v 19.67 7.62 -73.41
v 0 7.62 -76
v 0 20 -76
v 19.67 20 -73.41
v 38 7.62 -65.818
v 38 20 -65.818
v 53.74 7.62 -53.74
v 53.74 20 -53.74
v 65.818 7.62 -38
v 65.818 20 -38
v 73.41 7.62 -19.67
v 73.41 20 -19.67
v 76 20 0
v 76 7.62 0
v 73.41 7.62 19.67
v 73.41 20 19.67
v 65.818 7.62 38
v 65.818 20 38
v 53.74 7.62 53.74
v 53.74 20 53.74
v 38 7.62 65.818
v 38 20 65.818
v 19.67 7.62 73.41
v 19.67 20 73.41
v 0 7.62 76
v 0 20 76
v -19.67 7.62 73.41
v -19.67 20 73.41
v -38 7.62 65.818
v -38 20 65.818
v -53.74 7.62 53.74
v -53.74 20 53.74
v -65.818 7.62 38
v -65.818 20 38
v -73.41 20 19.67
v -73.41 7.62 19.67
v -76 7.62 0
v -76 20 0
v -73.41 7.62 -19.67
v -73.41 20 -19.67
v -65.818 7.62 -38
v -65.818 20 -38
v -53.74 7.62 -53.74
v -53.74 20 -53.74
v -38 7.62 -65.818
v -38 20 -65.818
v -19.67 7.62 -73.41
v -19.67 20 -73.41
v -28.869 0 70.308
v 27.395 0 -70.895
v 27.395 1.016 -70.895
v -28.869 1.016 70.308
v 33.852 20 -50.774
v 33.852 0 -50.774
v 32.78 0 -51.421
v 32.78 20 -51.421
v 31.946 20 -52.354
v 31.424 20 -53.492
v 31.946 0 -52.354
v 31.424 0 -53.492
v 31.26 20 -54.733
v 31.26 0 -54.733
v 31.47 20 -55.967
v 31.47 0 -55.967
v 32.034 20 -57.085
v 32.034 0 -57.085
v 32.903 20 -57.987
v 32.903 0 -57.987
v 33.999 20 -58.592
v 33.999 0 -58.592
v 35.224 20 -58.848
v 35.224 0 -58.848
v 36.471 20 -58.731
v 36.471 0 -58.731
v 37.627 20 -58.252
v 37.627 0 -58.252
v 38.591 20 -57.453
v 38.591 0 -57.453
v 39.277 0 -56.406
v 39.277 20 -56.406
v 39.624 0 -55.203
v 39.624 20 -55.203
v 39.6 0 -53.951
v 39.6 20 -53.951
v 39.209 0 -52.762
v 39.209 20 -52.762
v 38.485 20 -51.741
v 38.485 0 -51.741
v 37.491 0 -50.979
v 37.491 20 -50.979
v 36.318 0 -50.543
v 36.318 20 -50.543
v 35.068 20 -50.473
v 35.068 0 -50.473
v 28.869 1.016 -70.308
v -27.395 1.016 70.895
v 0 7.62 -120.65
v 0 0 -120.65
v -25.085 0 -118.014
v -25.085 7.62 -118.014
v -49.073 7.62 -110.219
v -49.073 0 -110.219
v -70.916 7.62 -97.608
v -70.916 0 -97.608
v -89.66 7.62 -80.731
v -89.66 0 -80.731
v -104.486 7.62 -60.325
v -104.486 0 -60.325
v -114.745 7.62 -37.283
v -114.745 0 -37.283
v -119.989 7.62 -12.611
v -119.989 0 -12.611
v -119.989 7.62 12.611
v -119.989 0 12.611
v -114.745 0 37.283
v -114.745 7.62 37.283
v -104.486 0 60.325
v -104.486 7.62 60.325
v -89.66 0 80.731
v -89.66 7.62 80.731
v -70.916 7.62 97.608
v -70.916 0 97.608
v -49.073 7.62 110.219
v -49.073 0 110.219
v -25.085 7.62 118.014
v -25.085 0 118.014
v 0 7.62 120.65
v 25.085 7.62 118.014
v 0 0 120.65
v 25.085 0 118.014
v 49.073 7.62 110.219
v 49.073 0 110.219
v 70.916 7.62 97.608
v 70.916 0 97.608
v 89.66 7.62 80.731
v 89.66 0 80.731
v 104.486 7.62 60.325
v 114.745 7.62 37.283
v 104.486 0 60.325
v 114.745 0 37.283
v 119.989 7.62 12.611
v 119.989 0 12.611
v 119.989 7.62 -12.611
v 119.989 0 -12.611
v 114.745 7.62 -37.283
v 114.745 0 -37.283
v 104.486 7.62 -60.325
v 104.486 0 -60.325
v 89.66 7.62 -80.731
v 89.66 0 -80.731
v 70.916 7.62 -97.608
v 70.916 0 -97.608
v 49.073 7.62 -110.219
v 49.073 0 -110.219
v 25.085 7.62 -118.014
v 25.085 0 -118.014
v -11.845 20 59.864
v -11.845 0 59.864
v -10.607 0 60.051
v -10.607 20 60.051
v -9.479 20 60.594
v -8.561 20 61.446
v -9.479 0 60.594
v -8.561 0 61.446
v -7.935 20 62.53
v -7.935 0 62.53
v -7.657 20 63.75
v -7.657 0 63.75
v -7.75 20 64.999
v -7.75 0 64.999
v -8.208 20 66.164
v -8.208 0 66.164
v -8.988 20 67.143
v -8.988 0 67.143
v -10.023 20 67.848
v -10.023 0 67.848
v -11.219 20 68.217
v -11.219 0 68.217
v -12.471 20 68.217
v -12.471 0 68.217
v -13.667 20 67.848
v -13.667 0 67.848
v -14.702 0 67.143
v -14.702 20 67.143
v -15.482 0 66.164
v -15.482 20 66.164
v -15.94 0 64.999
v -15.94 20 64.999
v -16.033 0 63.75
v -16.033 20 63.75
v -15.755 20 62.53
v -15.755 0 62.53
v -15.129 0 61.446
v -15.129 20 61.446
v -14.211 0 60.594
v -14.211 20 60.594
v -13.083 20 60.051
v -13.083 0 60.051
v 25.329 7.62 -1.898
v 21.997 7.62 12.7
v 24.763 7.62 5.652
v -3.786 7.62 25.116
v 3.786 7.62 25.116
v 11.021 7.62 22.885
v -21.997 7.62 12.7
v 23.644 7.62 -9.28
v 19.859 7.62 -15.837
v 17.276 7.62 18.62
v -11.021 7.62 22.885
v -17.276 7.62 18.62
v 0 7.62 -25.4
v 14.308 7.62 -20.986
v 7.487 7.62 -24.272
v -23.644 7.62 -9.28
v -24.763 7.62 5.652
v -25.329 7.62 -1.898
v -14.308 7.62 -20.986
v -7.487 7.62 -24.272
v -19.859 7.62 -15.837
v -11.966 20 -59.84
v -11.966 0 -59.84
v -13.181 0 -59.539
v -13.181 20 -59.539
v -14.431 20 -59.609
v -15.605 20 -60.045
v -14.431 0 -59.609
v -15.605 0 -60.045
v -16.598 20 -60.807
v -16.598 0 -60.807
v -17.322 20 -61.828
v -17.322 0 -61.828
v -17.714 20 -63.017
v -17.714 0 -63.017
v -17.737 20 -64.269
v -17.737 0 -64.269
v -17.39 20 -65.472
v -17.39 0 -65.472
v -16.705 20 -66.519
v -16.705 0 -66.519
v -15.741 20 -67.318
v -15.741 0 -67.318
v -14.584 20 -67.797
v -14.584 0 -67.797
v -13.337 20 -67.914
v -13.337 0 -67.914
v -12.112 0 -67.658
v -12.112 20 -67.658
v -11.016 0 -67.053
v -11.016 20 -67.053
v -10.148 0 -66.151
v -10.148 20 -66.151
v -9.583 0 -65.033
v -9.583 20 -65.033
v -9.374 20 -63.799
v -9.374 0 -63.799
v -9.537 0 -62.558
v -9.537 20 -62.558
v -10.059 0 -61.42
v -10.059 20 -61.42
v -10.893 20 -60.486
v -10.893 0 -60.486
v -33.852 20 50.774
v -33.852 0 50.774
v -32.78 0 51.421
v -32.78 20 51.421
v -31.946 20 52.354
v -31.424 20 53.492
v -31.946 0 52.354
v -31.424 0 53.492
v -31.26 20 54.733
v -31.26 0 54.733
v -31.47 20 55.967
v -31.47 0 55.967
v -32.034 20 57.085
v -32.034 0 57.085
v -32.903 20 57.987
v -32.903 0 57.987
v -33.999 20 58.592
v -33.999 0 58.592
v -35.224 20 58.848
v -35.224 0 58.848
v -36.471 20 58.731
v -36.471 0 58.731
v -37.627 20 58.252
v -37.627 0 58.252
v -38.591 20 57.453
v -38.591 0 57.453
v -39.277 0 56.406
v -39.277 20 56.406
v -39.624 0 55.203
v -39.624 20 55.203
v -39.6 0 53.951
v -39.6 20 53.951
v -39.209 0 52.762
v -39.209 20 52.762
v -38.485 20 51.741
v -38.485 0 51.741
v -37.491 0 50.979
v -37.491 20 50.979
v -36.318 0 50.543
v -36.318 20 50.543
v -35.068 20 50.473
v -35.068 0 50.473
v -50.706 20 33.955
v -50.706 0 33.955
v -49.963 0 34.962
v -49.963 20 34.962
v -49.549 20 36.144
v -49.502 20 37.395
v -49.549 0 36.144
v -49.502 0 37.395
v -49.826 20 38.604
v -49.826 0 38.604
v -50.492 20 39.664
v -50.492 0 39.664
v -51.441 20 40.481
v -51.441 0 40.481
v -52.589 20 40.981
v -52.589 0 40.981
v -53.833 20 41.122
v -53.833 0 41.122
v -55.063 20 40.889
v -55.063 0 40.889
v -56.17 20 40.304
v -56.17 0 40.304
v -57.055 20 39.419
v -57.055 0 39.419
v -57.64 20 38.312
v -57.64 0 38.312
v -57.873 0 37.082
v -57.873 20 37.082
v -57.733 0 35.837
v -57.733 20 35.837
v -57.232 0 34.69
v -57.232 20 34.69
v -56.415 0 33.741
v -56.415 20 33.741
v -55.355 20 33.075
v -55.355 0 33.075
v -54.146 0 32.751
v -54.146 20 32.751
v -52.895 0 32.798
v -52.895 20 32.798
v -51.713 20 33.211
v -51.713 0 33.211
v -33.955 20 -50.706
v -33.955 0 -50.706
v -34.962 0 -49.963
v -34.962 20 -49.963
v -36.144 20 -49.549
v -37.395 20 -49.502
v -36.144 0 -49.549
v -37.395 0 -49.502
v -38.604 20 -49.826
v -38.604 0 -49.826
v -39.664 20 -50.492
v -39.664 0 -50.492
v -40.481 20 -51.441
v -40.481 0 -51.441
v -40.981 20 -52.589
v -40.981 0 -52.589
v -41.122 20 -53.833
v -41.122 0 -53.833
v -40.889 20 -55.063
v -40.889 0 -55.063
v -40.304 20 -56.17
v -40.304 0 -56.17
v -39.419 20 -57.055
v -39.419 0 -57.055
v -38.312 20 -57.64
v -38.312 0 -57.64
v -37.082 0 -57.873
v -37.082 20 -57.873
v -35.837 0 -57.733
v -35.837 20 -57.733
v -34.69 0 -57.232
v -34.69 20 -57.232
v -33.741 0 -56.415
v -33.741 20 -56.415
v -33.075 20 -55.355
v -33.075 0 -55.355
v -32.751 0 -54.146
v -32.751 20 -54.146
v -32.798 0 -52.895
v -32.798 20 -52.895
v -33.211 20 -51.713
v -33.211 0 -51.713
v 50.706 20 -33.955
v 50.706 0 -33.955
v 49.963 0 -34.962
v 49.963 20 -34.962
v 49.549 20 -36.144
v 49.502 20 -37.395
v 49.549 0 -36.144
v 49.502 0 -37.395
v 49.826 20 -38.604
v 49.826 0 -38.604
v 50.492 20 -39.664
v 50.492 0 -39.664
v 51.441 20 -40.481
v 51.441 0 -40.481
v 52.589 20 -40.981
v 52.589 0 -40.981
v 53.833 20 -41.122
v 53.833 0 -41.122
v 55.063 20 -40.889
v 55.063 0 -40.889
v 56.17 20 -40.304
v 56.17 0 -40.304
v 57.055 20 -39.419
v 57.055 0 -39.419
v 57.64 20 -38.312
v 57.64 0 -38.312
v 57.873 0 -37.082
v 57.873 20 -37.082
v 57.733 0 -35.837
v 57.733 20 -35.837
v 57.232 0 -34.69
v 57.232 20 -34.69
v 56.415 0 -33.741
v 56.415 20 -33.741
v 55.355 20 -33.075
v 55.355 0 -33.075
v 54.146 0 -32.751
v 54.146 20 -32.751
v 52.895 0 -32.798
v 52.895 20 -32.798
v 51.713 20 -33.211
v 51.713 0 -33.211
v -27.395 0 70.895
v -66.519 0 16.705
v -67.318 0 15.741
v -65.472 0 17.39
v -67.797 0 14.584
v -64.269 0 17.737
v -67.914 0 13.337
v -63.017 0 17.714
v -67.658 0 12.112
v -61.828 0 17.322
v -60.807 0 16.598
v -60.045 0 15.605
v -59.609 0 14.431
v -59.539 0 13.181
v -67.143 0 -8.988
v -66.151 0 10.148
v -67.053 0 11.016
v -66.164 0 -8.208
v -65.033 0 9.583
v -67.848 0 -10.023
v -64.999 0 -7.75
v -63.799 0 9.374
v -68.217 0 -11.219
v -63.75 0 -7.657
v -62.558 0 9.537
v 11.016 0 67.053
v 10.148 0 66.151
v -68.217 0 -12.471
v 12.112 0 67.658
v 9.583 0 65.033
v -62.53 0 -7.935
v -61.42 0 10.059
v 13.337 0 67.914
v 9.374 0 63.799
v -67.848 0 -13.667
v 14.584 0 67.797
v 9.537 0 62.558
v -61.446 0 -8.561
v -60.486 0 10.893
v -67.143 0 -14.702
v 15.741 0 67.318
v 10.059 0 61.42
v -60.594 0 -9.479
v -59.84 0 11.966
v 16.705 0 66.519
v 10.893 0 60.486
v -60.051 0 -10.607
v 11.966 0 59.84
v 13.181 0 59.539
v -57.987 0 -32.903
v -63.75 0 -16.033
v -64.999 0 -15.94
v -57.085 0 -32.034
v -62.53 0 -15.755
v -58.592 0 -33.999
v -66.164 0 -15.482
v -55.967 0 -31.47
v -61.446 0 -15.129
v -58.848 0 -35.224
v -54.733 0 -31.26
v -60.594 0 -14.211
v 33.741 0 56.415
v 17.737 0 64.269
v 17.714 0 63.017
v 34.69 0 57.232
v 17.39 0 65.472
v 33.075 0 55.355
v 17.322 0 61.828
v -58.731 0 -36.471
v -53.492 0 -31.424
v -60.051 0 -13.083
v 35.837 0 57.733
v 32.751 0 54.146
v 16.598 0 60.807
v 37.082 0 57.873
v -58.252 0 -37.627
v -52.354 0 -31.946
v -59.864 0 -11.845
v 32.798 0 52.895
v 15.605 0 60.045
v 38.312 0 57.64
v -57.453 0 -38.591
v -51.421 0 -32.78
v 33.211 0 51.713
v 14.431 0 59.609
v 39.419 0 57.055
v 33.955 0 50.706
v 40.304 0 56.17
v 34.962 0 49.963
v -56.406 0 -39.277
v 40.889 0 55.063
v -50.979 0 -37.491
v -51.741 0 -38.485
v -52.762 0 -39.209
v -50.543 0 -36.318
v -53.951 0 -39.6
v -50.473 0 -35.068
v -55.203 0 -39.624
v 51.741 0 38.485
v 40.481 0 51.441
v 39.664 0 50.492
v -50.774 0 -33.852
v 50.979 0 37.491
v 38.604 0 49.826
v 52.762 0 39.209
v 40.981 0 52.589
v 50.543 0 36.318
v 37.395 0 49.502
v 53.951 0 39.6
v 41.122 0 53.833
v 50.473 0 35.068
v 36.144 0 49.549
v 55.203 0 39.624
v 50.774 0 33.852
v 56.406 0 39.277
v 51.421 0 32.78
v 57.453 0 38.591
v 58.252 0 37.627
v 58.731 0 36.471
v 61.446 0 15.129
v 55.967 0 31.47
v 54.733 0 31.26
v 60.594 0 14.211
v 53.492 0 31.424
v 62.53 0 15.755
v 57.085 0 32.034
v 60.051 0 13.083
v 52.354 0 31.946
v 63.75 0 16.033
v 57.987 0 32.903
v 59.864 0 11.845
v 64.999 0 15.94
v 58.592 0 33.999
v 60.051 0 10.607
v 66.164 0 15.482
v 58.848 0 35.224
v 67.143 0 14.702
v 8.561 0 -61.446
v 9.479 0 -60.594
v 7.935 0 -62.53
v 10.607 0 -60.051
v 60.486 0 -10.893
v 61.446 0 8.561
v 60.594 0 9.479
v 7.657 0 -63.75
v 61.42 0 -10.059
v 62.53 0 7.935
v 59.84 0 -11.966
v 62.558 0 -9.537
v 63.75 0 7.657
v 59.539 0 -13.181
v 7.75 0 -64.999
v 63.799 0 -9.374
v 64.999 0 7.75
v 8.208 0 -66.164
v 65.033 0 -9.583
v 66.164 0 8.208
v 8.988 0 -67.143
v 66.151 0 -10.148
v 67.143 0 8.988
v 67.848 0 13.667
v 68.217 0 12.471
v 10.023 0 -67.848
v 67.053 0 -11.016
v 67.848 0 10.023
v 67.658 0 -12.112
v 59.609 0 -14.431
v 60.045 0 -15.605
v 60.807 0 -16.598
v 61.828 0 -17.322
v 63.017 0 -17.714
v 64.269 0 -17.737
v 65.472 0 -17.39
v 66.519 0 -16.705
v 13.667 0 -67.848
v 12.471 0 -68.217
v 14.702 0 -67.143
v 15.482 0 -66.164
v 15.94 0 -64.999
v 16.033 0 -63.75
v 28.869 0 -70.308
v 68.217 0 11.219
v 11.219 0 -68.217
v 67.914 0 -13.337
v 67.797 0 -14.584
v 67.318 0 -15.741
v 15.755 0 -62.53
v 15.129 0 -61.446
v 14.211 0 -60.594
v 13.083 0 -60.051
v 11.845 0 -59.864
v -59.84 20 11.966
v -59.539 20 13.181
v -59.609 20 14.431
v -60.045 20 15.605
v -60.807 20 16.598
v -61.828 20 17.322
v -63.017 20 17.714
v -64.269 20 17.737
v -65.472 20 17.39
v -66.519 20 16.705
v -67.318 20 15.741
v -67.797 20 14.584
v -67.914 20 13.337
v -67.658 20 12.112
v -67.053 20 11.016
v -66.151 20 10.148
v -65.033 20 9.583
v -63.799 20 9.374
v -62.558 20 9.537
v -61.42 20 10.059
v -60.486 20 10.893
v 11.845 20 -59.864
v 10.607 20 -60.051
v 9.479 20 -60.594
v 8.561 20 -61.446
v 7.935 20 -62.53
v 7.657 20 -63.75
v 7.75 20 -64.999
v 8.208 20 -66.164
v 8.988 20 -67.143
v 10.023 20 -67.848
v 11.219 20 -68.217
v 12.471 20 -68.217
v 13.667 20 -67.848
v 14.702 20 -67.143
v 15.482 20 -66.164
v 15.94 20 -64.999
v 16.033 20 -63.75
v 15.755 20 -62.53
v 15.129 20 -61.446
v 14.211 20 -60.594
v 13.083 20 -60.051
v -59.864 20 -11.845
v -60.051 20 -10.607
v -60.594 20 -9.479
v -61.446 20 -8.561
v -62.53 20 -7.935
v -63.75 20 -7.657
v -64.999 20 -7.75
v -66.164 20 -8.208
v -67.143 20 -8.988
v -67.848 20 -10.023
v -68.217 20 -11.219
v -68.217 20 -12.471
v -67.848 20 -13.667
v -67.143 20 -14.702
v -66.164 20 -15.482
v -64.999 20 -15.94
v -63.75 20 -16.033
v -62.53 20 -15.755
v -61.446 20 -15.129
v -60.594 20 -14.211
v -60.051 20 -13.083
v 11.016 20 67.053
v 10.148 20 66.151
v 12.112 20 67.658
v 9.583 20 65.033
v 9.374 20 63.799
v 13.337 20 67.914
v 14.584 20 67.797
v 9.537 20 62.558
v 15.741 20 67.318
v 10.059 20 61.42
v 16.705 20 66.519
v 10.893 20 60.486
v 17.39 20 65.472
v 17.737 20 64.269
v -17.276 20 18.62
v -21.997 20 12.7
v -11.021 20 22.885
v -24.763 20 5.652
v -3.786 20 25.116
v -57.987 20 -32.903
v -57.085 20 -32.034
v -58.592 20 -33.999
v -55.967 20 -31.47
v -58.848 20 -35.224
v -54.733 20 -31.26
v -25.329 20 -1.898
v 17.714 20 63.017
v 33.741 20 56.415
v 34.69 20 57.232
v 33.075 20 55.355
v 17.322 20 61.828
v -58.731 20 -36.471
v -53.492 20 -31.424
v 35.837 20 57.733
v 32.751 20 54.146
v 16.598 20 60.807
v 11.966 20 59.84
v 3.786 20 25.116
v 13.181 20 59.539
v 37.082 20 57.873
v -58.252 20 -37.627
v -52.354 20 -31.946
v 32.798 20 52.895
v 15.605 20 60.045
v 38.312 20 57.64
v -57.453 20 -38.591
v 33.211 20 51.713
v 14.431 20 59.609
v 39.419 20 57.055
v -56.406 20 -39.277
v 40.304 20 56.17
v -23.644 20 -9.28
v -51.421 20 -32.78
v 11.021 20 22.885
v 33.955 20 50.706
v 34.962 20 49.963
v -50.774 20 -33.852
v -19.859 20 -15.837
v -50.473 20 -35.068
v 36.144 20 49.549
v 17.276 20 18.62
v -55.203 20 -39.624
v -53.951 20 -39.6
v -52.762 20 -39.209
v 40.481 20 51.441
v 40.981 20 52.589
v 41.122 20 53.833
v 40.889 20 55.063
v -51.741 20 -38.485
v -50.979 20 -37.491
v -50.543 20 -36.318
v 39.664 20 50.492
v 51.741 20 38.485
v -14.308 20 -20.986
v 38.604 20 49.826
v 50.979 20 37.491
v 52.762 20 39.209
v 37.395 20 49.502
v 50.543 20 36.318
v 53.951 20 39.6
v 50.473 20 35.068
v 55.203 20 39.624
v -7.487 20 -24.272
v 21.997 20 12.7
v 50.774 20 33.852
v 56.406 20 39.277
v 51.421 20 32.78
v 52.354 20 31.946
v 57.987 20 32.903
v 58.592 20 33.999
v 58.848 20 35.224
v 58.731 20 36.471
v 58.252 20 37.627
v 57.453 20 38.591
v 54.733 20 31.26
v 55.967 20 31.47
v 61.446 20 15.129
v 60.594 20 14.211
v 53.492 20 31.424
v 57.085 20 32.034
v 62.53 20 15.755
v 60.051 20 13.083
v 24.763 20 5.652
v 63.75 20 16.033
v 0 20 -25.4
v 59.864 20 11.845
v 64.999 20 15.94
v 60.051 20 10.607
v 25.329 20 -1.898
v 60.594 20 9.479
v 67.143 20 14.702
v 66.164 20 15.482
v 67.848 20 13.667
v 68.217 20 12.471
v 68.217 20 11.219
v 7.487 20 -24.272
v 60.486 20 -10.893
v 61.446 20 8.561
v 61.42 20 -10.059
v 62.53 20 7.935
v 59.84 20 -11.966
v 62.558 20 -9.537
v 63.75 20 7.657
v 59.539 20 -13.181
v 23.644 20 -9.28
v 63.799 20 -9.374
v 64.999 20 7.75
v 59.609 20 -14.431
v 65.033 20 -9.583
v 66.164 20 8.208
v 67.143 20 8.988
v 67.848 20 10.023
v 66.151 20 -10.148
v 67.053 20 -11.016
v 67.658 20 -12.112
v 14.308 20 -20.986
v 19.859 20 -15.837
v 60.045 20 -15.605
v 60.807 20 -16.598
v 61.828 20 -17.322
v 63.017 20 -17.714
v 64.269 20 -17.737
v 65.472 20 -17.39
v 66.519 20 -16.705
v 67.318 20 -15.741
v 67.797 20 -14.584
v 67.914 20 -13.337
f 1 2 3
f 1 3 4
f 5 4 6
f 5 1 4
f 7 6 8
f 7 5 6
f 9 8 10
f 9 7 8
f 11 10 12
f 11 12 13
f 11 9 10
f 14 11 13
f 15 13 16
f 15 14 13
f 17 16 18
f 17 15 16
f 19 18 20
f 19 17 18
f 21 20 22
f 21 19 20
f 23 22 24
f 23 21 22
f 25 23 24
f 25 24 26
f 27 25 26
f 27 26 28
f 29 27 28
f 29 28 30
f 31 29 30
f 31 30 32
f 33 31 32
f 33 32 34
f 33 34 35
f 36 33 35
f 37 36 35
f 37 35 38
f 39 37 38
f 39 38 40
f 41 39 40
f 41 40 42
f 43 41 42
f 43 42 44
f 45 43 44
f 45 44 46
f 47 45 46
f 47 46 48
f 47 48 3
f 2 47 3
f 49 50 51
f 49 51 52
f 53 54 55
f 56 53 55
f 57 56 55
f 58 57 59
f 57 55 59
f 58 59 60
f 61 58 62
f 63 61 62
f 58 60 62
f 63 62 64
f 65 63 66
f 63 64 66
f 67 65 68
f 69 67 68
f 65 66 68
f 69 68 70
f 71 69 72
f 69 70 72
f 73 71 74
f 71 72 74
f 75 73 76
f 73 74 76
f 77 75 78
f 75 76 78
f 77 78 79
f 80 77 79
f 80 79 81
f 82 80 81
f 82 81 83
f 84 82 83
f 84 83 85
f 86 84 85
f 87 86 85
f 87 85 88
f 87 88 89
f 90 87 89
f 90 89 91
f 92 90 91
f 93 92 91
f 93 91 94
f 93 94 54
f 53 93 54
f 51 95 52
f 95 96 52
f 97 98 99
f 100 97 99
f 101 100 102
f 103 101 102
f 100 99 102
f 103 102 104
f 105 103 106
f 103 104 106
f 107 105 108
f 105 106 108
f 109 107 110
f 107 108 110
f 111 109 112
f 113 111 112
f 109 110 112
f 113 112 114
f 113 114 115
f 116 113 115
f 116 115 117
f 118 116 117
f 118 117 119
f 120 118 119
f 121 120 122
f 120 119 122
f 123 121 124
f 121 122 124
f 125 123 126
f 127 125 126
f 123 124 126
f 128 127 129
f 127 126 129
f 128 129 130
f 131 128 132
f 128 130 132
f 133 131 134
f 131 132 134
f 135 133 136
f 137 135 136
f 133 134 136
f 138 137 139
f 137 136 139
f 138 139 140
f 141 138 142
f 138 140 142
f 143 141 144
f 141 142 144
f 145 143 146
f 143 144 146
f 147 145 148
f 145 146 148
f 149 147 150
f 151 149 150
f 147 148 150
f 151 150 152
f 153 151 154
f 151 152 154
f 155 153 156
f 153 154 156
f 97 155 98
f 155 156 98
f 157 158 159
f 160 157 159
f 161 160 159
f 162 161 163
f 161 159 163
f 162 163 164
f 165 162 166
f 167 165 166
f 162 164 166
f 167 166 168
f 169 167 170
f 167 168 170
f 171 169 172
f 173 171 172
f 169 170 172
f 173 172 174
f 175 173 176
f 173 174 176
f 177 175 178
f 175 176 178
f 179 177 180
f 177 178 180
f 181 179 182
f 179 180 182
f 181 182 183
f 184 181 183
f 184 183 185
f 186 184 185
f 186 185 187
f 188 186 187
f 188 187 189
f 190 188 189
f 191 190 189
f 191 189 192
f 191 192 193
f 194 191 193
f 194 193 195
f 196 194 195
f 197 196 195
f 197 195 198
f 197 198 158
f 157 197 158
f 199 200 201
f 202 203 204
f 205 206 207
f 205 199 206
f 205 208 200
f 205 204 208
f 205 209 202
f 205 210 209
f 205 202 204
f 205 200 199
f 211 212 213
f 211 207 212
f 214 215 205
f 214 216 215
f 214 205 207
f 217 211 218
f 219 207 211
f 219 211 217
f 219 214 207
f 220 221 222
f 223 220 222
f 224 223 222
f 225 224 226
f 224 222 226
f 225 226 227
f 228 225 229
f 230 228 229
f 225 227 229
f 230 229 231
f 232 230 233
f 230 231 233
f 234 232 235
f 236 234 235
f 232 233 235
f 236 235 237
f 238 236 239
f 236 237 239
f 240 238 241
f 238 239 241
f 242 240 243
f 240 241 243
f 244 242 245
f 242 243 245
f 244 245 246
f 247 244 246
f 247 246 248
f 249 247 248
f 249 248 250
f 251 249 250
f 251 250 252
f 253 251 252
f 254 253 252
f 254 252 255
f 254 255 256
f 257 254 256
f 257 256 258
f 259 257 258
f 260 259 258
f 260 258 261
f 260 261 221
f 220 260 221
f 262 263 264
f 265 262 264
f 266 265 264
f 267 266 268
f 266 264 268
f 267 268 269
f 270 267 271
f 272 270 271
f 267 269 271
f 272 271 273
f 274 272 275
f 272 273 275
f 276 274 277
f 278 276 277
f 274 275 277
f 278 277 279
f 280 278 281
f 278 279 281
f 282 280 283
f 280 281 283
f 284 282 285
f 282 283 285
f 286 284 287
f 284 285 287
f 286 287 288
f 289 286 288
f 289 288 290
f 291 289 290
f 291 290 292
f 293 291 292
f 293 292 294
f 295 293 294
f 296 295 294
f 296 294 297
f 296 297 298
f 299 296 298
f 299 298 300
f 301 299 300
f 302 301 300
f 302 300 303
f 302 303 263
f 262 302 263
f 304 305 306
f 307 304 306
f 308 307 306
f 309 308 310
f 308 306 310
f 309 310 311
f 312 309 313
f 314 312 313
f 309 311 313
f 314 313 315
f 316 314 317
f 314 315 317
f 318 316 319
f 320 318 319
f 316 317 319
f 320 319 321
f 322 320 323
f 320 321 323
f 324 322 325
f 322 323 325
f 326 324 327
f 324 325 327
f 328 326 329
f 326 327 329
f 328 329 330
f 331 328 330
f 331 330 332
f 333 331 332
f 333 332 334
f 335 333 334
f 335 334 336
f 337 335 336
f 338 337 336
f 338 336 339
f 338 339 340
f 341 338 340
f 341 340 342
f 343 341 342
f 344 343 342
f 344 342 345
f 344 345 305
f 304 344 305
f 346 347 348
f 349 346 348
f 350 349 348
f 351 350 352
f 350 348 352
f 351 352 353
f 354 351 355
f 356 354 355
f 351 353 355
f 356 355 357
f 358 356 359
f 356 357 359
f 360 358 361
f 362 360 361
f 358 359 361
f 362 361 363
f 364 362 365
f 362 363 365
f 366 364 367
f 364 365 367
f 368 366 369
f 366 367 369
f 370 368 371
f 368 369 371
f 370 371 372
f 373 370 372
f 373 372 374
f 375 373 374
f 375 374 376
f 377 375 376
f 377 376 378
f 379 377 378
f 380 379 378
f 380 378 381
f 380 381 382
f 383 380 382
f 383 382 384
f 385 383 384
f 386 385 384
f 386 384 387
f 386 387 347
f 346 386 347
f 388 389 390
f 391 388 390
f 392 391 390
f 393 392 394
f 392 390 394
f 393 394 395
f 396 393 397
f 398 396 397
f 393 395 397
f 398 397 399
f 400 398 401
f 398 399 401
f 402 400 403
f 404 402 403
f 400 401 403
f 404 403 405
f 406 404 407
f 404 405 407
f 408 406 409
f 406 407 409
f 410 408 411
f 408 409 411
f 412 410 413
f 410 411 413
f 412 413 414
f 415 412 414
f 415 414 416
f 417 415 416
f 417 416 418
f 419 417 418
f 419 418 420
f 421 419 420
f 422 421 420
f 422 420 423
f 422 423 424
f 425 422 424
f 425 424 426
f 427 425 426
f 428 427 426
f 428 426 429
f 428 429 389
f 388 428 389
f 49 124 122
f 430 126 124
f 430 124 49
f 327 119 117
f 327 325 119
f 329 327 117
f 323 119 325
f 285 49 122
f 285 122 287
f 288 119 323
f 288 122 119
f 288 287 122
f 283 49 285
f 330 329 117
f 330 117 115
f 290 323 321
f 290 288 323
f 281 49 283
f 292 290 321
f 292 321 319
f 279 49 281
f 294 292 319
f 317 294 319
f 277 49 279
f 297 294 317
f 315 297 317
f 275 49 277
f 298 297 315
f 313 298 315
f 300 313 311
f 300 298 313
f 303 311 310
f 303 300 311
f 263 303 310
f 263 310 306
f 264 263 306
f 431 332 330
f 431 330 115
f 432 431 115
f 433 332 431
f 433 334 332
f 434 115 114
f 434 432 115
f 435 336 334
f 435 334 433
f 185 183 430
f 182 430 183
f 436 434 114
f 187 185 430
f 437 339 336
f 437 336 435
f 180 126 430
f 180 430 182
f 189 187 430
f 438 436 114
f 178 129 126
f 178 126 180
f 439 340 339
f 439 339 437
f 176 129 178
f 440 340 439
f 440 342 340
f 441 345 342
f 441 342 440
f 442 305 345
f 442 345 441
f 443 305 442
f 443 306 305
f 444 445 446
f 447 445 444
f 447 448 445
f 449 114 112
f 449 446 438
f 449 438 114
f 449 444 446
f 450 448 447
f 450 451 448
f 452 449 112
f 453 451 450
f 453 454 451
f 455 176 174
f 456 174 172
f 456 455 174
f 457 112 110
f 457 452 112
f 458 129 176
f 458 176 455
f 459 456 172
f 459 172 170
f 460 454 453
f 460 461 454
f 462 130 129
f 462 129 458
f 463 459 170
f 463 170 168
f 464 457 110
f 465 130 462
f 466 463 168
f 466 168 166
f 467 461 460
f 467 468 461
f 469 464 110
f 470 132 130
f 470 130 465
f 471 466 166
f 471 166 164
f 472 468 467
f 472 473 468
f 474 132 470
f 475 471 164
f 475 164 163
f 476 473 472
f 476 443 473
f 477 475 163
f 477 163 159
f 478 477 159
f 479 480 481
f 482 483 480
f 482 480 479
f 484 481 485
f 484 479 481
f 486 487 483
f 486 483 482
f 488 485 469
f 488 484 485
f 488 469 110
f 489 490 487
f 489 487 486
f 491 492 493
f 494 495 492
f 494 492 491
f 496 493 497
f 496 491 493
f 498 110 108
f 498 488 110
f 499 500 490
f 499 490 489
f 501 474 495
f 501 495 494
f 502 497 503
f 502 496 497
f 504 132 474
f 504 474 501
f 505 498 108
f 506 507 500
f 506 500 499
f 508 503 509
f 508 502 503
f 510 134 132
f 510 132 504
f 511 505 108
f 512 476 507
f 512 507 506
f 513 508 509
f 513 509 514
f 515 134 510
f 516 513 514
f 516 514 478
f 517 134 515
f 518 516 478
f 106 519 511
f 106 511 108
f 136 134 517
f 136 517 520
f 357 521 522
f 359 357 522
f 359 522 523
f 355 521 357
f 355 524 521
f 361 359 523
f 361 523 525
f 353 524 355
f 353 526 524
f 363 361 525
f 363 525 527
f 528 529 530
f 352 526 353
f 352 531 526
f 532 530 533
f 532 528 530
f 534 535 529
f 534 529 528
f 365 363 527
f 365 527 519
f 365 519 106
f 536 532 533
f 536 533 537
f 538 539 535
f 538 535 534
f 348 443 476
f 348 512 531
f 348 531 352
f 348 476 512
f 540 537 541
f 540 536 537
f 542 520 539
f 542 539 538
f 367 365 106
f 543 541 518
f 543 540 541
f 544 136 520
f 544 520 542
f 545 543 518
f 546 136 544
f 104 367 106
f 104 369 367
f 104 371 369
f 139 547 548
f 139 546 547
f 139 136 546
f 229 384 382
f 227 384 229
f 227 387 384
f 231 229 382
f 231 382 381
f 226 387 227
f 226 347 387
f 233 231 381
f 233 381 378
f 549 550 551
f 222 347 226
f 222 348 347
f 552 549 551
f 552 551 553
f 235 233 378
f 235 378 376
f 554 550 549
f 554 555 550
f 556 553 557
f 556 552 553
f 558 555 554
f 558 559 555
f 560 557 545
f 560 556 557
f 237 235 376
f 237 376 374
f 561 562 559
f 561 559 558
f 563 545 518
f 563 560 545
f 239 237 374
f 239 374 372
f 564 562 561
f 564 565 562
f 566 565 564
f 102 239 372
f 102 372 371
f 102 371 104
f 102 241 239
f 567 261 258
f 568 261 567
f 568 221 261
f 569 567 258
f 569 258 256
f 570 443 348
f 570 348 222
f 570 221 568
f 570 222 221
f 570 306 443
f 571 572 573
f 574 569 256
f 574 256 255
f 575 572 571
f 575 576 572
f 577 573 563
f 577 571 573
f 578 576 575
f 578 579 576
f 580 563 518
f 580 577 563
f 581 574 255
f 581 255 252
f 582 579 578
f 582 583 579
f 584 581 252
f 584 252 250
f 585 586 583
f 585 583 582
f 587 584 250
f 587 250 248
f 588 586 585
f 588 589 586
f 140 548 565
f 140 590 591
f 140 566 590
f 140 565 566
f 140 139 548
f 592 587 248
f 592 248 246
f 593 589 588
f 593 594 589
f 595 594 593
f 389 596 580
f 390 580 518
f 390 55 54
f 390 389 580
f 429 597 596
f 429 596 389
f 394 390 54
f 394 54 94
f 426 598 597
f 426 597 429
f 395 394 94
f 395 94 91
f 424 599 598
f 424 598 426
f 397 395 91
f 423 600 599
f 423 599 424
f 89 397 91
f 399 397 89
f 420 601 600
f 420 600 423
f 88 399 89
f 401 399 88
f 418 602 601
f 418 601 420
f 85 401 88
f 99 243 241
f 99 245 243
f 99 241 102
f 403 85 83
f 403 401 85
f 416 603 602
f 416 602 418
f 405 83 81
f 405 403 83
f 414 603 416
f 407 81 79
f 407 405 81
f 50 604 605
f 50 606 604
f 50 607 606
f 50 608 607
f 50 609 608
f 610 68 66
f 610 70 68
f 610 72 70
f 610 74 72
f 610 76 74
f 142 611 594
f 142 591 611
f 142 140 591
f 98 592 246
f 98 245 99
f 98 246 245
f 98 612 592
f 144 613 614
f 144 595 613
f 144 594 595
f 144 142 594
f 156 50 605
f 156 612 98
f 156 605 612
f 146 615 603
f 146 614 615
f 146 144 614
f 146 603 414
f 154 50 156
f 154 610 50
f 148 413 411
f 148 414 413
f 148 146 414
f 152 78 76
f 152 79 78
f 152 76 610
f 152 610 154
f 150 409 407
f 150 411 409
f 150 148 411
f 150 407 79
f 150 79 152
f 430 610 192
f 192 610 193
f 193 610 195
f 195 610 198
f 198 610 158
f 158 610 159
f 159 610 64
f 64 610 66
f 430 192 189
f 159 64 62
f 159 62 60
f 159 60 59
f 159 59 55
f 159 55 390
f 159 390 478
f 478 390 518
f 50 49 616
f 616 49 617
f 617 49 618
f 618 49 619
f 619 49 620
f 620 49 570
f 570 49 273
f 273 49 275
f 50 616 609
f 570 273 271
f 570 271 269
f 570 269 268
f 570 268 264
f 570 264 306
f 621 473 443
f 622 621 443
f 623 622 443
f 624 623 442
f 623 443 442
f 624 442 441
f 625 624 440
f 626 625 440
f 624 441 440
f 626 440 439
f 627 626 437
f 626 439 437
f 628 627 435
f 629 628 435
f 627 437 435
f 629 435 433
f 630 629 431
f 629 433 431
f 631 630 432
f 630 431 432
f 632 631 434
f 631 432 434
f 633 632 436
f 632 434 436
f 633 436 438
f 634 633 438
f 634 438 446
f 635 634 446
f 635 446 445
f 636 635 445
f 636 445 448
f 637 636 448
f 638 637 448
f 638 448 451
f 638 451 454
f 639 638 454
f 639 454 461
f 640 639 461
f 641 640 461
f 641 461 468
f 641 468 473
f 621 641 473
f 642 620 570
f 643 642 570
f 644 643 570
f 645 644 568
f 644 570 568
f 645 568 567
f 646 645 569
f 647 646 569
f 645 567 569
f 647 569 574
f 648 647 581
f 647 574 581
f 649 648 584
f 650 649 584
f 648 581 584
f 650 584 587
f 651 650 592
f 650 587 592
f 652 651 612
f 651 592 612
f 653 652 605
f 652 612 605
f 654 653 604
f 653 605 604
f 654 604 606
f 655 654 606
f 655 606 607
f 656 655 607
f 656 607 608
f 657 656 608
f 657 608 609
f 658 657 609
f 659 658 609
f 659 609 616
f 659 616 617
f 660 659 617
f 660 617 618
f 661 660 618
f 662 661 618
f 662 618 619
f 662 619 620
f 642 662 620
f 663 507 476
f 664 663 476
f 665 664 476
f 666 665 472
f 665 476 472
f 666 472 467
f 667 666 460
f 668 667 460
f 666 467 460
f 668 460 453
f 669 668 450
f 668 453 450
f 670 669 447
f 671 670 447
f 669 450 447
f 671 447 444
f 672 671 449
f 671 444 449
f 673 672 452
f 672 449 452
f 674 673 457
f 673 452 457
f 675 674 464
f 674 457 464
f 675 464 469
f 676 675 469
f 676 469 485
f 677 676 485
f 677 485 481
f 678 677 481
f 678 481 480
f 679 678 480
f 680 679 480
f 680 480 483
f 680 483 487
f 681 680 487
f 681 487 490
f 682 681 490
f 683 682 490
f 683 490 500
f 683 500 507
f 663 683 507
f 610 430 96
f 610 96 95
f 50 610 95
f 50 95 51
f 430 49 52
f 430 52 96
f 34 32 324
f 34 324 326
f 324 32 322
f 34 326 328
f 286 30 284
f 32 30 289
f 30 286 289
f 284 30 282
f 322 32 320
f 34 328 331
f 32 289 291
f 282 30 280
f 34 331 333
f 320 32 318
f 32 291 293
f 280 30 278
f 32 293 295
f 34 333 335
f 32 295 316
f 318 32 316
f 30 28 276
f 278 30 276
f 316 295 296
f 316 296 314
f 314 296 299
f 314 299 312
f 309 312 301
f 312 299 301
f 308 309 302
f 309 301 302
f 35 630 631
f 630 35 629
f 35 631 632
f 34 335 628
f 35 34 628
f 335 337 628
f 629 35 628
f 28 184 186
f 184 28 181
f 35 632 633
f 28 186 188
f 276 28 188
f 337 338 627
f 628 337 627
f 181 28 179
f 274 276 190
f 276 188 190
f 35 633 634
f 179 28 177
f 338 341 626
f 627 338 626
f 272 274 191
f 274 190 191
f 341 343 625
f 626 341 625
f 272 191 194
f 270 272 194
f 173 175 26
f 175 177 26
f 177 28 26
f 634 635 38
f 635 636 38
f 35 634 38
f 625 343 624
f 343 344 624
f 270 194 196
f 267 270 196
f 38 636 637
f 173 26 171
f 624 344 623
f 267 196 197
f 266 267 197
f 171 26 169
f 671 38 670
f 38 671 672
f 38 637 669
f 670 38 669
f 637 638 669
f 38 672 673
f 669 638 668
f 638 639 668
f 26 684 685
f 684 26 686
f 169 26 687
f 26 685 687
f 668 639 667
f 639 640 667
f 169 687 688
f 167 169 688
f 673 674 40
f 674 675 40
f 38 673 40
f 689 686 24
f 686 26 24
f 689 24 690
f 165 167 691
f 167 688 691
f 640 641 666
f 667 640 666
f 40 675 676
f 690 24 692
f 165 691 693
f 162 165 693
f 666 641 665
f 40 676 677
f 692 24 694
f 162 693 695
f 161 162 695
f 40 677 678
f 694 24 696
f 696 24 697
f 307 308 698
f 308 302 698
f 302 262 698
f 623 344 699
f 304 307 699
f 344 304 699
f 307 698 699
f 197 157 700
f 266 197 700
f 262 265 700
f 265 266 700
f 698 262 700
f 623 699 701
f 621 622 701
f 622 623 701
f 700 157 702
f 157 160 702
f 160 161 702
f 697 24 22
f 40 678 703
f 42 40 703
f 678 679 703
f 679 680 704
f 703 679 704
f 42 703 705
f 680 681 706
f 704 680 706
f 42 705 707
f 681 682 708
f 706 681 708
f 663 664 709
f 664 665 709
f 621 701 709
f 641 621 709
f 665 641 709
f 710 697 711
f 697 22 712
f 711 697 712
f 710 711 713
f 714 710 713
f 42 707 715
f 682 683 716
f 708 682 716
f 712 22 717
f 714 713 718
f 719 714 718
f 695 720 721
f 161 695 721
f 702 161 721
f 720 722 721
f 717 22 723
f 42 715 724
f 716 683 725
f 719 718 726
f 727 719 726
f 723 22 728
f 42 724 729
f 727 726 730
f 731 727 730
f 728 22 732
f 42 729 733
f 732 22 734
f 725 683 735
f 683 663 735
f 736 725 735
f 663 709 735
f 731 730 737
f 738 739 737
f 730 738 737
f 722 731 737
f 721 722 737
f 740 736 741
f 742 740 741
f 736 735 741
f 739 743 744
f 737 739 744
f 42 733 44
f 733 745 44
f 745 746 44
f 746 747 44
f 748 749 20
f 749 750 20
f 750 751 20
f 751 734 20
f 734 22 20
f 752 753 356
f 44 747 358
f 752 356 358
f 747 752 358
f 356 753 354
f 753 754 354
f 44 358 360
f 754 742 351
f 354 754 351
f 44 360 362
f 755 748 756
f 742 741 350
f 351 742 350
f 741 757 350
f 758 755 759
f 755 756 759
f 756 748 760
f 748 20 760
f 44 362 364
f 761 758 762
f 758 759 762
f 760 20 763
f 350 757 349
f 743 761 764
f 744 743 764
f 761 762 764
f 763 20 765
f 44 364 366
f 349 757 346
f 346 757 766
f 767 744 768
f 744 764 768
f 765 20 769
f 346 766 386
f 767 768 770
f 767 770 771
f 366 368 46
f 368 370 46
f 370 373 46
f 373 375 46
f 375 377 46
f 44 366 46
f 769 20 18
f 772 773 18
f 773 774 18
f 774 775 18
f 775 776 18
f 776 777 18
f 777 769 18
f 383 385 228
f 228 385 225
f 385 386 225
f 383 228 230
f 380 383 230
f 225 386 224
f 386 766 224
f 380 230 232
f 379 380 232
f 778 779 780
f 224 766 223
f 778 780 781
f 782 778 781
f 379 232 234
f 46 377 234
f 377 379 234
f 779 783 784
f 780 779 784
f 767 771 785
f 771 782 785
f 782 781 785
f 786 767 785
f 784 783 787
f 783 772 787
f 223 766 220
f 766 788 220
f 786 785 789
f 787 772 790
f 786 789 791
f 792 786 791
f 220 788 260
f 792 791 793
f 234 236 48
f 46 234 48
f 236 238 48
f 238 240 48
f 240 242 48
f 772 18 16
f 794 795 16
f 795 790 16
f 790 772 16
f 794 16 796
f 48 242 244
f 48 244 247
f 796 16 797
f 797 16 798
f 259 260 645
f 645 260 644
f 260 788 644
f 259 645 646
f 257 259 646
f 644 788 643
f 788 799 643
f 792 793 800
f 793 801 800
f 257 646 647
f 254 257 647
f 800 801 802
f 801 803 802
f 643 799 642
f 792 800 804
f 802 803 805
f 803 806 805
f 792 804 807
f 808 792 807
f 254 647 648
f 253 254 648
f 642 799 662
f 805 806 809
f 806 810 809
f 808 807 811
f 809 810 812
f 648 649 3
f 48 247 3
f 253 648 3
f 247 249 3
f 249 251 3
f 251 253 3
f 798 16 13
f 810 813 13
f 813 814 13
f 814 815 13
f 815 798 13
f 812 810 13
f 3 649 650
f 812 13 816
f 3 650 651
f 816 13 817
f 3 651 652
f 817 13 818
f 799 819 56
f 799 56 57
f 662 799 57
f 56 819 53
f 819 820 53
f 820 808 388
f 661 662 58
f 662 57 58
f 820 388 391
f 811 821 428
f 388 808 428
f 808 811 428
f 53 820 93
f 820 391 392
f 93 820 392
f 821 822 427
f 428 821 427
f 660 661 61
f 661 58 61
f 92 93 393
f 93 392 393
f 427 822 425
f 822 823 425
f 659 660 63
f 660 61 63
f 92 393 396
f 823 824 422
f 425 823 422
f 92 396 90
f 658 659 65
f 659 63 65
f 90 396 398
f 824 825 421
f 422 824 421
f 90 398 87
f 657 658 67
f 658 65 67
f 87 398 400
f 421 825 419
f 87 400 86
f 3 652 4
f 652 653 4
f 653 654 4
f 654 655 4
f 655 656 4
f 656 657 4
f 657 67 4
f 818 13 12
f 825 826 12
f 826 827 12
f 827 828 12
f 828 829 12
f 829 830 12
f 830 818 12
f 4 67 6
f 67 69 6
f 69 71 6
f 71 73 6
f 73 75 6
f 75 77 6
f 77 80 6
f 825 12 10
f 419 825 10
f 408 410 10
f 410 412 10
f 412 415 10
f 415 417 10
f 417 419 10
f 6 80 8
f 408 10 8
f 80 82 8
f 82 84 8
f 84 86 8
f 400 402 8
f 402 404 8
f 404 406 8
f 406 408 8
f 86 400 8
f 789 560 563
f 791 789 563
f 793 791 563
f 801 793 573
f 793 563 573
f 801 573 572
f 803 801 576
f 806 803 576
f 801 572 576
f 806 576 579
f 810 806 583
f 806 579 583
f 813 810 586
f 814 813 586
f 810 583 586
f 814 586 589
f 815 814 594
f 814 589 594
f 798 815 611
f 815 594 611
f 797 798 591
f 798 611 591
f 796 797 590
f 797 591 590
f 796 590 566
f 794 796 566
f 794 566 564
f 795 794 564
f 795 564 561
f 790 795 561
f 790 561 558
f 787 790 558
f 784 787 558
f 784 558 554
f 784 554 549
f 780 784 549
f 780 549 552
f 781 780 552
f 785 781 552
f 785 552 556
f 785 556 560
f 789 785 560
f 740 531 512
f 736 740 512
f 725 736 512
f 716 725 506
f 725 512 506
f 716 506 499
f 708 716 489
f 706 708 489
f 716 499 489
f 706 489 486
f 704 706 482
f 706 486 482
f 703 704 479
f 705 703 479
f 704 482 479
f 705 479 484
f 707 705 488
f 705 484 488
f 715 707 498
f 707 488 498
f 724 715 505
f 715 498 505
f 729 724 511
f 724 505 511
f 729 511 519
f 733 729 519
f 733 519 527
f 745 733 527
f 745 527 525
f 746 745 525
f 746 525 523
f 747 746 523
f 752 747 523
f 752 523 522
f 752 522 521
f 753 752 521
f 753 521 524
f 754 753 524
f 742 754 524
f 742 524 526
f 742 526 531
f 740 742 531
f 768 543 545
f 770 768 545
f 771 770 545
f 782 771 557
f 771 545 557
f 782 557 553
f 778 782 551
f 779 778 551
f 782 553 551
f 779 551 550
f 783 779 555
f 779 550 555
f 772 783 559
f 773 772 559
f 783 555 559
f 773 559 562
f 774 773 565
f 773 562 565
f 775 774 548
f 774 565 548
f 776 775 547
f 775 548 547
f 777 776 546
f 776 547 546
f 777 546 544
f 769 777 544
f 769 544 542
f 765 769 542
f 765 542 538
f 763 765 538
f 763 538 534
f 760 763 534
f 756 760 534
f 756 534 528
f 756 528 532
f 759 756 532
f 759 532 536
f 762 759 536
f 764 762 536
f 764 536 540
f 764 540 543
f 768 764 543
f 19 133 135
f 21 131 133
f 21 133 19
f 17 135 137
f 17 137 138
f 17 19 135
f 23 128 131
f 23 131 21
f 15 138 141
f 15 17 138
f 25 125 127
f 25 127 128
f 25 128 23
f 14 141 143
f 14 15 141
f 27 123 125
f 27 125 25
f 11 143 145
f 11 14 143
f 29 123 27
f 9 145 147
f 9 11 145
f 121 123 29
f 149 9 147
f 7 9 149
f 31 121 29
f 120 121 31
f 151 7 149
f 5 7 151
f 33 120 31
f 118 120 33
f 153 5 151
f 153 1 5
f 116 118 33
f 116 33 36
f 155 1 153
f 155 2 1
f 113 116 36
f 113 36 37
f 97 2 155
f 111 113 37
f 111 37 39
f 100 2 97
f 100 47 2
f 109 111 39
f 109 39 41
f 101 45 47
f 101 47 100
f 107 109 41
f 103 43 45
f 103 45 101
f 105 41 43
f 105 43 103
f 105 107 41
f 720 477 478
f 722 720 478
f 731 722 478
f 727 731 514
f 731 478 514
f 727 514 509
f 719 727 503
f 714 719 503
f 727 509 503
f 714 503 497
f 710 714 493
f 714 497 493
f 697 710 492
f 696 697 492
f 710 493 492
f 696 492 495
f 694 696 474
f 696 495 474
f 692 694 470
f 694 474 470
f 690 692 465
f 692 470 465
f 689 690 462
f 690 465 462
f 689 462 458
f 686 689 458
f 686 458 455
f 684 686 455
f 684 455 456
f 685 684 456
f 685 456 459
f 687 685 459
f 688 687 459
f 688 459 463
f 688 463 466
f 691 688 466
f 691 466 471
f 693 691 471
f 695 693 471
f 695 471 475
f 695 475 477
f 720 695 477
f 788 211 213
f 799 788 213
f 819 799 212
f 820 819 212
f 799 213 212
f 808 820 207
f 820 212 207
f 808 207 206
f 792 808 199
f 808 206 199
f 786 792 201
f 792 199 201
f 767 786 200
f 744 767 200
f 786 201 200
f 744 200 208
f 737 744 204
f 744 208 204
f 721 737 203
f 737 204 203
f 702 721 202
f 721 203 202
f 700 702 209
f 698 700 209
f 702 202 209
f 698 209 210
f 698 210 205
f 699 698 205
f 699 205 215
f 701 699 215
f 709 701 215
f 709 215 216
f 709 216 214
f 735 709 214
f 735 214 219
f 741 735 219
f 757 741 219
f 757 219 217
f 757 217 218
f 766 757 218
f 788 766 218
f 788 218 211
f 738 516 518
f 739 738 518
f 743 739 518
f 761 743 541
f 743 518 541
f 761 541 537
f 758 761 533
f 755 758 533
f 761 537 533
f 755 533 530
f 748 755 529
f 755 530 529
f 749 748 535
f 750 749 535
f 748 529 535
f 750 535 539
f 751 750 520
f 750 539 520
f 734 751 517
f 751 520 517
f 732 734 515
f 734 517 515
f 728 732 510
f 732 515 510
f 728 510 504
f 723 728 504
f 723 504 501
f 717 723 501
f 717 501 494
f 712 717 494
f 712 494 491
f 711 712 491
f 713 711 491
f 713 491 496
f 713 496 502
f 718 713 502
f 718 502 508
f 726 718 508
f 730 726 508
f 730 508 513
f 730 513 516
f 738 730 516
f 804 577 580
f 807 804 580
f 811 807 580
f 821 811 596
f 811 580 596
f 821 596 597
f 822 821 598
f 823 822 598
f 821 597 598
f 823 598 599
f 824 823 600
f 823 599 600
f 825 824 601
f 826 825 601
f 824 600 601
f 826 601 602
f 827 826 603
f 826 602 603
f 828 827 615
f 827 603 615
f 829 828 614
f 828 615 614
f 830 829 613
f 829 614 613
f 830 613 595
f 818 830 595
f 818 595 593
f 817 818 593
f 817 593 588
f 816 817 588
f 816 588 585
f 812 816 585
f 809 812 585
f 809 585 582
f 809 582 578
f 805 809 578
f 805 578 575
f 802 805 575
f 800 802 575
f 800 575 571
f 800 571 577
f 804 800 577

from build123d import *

# Parameters (mm, degrees)
SKETCH1_R         = 120.65
EXTRUDE1_DEPTH    = 7.62
SKETCH2_R         = 76.0000004
SKETCH2_R_2       = 25.4
EXTRUDE2_DEPTH    = 20
EXTRUDE3_DEPTH    = 1.016
EXTRUDE4_REACH    = 173.793
SKETCH8_R         = 4.2
CIRPATTERN1_COUNT = 16


with BuildPart() as part:
    # Sketch1 → Extrude1 (new body)
    with BuildSketch(Plane(origin=(0, 0, 0), x_dir=(1, 0, 0), z_dir=(0, 1, 0))):
        Circle(SKETCH1_R)
    extrude(amount=EXTRUDE1_DEPTH)

    # Sketch2 → Extrude2 (add)
    with BuildSketch(Plane.XZ):
        Circle(SKETCH2_R)
        Circle(SKETCH2_R_2, mode=Mode.SUBTRACT)
    extrude(amount=-EXTRUDE2_DEPTH)

    # Sketch5 → Extrude3 (cut)
    with BuildSketch(Plane.XZ):
        Polygon((28.869265873, -70.307862916), (27.394526953, -70.895486407), (-28.869265873, 70.307862916), (-27.394526953, 70.895486407), align=None)
    extrude(amount=-EXTRUDE3_DEPTH, mode=Mode.SUBTRACT)

    # Sketch8 → Extrude4 (cut, up to next)
    with BuildSketch(Plane.XZ, mode=Mode.PRIVATE) as extrude4_sk1:
        with Locations((-11.84499556, 64.064175482)):
            Circle(SKETCH8_R)
    extrude4_tool1 = extrude(extrude4_sk1.sketch, amount=-EXTRUDE4_REACH, mode=Mode.PRIVATE) & part.part
    extrude4 = extrude4_tool1.solids().sort_by_distance((-11.844996, 0, 64.064175))[0]
    add(extrude4, mode=Mode.SUBTRACT)

    # CirPattern1: Extrude4 ×16 about axis
    cirpattern1_axis = Axis((0, 20, 0), (0, -1, 0))
    for i in range(1, CIRPATTERN1_COUNT):
        add(extrude4.rotate(cirpattern1_axis, i * 360 / CIRPATTERN1_COUNT), mode=Mode.SUBTRACT)


solid = part.part
